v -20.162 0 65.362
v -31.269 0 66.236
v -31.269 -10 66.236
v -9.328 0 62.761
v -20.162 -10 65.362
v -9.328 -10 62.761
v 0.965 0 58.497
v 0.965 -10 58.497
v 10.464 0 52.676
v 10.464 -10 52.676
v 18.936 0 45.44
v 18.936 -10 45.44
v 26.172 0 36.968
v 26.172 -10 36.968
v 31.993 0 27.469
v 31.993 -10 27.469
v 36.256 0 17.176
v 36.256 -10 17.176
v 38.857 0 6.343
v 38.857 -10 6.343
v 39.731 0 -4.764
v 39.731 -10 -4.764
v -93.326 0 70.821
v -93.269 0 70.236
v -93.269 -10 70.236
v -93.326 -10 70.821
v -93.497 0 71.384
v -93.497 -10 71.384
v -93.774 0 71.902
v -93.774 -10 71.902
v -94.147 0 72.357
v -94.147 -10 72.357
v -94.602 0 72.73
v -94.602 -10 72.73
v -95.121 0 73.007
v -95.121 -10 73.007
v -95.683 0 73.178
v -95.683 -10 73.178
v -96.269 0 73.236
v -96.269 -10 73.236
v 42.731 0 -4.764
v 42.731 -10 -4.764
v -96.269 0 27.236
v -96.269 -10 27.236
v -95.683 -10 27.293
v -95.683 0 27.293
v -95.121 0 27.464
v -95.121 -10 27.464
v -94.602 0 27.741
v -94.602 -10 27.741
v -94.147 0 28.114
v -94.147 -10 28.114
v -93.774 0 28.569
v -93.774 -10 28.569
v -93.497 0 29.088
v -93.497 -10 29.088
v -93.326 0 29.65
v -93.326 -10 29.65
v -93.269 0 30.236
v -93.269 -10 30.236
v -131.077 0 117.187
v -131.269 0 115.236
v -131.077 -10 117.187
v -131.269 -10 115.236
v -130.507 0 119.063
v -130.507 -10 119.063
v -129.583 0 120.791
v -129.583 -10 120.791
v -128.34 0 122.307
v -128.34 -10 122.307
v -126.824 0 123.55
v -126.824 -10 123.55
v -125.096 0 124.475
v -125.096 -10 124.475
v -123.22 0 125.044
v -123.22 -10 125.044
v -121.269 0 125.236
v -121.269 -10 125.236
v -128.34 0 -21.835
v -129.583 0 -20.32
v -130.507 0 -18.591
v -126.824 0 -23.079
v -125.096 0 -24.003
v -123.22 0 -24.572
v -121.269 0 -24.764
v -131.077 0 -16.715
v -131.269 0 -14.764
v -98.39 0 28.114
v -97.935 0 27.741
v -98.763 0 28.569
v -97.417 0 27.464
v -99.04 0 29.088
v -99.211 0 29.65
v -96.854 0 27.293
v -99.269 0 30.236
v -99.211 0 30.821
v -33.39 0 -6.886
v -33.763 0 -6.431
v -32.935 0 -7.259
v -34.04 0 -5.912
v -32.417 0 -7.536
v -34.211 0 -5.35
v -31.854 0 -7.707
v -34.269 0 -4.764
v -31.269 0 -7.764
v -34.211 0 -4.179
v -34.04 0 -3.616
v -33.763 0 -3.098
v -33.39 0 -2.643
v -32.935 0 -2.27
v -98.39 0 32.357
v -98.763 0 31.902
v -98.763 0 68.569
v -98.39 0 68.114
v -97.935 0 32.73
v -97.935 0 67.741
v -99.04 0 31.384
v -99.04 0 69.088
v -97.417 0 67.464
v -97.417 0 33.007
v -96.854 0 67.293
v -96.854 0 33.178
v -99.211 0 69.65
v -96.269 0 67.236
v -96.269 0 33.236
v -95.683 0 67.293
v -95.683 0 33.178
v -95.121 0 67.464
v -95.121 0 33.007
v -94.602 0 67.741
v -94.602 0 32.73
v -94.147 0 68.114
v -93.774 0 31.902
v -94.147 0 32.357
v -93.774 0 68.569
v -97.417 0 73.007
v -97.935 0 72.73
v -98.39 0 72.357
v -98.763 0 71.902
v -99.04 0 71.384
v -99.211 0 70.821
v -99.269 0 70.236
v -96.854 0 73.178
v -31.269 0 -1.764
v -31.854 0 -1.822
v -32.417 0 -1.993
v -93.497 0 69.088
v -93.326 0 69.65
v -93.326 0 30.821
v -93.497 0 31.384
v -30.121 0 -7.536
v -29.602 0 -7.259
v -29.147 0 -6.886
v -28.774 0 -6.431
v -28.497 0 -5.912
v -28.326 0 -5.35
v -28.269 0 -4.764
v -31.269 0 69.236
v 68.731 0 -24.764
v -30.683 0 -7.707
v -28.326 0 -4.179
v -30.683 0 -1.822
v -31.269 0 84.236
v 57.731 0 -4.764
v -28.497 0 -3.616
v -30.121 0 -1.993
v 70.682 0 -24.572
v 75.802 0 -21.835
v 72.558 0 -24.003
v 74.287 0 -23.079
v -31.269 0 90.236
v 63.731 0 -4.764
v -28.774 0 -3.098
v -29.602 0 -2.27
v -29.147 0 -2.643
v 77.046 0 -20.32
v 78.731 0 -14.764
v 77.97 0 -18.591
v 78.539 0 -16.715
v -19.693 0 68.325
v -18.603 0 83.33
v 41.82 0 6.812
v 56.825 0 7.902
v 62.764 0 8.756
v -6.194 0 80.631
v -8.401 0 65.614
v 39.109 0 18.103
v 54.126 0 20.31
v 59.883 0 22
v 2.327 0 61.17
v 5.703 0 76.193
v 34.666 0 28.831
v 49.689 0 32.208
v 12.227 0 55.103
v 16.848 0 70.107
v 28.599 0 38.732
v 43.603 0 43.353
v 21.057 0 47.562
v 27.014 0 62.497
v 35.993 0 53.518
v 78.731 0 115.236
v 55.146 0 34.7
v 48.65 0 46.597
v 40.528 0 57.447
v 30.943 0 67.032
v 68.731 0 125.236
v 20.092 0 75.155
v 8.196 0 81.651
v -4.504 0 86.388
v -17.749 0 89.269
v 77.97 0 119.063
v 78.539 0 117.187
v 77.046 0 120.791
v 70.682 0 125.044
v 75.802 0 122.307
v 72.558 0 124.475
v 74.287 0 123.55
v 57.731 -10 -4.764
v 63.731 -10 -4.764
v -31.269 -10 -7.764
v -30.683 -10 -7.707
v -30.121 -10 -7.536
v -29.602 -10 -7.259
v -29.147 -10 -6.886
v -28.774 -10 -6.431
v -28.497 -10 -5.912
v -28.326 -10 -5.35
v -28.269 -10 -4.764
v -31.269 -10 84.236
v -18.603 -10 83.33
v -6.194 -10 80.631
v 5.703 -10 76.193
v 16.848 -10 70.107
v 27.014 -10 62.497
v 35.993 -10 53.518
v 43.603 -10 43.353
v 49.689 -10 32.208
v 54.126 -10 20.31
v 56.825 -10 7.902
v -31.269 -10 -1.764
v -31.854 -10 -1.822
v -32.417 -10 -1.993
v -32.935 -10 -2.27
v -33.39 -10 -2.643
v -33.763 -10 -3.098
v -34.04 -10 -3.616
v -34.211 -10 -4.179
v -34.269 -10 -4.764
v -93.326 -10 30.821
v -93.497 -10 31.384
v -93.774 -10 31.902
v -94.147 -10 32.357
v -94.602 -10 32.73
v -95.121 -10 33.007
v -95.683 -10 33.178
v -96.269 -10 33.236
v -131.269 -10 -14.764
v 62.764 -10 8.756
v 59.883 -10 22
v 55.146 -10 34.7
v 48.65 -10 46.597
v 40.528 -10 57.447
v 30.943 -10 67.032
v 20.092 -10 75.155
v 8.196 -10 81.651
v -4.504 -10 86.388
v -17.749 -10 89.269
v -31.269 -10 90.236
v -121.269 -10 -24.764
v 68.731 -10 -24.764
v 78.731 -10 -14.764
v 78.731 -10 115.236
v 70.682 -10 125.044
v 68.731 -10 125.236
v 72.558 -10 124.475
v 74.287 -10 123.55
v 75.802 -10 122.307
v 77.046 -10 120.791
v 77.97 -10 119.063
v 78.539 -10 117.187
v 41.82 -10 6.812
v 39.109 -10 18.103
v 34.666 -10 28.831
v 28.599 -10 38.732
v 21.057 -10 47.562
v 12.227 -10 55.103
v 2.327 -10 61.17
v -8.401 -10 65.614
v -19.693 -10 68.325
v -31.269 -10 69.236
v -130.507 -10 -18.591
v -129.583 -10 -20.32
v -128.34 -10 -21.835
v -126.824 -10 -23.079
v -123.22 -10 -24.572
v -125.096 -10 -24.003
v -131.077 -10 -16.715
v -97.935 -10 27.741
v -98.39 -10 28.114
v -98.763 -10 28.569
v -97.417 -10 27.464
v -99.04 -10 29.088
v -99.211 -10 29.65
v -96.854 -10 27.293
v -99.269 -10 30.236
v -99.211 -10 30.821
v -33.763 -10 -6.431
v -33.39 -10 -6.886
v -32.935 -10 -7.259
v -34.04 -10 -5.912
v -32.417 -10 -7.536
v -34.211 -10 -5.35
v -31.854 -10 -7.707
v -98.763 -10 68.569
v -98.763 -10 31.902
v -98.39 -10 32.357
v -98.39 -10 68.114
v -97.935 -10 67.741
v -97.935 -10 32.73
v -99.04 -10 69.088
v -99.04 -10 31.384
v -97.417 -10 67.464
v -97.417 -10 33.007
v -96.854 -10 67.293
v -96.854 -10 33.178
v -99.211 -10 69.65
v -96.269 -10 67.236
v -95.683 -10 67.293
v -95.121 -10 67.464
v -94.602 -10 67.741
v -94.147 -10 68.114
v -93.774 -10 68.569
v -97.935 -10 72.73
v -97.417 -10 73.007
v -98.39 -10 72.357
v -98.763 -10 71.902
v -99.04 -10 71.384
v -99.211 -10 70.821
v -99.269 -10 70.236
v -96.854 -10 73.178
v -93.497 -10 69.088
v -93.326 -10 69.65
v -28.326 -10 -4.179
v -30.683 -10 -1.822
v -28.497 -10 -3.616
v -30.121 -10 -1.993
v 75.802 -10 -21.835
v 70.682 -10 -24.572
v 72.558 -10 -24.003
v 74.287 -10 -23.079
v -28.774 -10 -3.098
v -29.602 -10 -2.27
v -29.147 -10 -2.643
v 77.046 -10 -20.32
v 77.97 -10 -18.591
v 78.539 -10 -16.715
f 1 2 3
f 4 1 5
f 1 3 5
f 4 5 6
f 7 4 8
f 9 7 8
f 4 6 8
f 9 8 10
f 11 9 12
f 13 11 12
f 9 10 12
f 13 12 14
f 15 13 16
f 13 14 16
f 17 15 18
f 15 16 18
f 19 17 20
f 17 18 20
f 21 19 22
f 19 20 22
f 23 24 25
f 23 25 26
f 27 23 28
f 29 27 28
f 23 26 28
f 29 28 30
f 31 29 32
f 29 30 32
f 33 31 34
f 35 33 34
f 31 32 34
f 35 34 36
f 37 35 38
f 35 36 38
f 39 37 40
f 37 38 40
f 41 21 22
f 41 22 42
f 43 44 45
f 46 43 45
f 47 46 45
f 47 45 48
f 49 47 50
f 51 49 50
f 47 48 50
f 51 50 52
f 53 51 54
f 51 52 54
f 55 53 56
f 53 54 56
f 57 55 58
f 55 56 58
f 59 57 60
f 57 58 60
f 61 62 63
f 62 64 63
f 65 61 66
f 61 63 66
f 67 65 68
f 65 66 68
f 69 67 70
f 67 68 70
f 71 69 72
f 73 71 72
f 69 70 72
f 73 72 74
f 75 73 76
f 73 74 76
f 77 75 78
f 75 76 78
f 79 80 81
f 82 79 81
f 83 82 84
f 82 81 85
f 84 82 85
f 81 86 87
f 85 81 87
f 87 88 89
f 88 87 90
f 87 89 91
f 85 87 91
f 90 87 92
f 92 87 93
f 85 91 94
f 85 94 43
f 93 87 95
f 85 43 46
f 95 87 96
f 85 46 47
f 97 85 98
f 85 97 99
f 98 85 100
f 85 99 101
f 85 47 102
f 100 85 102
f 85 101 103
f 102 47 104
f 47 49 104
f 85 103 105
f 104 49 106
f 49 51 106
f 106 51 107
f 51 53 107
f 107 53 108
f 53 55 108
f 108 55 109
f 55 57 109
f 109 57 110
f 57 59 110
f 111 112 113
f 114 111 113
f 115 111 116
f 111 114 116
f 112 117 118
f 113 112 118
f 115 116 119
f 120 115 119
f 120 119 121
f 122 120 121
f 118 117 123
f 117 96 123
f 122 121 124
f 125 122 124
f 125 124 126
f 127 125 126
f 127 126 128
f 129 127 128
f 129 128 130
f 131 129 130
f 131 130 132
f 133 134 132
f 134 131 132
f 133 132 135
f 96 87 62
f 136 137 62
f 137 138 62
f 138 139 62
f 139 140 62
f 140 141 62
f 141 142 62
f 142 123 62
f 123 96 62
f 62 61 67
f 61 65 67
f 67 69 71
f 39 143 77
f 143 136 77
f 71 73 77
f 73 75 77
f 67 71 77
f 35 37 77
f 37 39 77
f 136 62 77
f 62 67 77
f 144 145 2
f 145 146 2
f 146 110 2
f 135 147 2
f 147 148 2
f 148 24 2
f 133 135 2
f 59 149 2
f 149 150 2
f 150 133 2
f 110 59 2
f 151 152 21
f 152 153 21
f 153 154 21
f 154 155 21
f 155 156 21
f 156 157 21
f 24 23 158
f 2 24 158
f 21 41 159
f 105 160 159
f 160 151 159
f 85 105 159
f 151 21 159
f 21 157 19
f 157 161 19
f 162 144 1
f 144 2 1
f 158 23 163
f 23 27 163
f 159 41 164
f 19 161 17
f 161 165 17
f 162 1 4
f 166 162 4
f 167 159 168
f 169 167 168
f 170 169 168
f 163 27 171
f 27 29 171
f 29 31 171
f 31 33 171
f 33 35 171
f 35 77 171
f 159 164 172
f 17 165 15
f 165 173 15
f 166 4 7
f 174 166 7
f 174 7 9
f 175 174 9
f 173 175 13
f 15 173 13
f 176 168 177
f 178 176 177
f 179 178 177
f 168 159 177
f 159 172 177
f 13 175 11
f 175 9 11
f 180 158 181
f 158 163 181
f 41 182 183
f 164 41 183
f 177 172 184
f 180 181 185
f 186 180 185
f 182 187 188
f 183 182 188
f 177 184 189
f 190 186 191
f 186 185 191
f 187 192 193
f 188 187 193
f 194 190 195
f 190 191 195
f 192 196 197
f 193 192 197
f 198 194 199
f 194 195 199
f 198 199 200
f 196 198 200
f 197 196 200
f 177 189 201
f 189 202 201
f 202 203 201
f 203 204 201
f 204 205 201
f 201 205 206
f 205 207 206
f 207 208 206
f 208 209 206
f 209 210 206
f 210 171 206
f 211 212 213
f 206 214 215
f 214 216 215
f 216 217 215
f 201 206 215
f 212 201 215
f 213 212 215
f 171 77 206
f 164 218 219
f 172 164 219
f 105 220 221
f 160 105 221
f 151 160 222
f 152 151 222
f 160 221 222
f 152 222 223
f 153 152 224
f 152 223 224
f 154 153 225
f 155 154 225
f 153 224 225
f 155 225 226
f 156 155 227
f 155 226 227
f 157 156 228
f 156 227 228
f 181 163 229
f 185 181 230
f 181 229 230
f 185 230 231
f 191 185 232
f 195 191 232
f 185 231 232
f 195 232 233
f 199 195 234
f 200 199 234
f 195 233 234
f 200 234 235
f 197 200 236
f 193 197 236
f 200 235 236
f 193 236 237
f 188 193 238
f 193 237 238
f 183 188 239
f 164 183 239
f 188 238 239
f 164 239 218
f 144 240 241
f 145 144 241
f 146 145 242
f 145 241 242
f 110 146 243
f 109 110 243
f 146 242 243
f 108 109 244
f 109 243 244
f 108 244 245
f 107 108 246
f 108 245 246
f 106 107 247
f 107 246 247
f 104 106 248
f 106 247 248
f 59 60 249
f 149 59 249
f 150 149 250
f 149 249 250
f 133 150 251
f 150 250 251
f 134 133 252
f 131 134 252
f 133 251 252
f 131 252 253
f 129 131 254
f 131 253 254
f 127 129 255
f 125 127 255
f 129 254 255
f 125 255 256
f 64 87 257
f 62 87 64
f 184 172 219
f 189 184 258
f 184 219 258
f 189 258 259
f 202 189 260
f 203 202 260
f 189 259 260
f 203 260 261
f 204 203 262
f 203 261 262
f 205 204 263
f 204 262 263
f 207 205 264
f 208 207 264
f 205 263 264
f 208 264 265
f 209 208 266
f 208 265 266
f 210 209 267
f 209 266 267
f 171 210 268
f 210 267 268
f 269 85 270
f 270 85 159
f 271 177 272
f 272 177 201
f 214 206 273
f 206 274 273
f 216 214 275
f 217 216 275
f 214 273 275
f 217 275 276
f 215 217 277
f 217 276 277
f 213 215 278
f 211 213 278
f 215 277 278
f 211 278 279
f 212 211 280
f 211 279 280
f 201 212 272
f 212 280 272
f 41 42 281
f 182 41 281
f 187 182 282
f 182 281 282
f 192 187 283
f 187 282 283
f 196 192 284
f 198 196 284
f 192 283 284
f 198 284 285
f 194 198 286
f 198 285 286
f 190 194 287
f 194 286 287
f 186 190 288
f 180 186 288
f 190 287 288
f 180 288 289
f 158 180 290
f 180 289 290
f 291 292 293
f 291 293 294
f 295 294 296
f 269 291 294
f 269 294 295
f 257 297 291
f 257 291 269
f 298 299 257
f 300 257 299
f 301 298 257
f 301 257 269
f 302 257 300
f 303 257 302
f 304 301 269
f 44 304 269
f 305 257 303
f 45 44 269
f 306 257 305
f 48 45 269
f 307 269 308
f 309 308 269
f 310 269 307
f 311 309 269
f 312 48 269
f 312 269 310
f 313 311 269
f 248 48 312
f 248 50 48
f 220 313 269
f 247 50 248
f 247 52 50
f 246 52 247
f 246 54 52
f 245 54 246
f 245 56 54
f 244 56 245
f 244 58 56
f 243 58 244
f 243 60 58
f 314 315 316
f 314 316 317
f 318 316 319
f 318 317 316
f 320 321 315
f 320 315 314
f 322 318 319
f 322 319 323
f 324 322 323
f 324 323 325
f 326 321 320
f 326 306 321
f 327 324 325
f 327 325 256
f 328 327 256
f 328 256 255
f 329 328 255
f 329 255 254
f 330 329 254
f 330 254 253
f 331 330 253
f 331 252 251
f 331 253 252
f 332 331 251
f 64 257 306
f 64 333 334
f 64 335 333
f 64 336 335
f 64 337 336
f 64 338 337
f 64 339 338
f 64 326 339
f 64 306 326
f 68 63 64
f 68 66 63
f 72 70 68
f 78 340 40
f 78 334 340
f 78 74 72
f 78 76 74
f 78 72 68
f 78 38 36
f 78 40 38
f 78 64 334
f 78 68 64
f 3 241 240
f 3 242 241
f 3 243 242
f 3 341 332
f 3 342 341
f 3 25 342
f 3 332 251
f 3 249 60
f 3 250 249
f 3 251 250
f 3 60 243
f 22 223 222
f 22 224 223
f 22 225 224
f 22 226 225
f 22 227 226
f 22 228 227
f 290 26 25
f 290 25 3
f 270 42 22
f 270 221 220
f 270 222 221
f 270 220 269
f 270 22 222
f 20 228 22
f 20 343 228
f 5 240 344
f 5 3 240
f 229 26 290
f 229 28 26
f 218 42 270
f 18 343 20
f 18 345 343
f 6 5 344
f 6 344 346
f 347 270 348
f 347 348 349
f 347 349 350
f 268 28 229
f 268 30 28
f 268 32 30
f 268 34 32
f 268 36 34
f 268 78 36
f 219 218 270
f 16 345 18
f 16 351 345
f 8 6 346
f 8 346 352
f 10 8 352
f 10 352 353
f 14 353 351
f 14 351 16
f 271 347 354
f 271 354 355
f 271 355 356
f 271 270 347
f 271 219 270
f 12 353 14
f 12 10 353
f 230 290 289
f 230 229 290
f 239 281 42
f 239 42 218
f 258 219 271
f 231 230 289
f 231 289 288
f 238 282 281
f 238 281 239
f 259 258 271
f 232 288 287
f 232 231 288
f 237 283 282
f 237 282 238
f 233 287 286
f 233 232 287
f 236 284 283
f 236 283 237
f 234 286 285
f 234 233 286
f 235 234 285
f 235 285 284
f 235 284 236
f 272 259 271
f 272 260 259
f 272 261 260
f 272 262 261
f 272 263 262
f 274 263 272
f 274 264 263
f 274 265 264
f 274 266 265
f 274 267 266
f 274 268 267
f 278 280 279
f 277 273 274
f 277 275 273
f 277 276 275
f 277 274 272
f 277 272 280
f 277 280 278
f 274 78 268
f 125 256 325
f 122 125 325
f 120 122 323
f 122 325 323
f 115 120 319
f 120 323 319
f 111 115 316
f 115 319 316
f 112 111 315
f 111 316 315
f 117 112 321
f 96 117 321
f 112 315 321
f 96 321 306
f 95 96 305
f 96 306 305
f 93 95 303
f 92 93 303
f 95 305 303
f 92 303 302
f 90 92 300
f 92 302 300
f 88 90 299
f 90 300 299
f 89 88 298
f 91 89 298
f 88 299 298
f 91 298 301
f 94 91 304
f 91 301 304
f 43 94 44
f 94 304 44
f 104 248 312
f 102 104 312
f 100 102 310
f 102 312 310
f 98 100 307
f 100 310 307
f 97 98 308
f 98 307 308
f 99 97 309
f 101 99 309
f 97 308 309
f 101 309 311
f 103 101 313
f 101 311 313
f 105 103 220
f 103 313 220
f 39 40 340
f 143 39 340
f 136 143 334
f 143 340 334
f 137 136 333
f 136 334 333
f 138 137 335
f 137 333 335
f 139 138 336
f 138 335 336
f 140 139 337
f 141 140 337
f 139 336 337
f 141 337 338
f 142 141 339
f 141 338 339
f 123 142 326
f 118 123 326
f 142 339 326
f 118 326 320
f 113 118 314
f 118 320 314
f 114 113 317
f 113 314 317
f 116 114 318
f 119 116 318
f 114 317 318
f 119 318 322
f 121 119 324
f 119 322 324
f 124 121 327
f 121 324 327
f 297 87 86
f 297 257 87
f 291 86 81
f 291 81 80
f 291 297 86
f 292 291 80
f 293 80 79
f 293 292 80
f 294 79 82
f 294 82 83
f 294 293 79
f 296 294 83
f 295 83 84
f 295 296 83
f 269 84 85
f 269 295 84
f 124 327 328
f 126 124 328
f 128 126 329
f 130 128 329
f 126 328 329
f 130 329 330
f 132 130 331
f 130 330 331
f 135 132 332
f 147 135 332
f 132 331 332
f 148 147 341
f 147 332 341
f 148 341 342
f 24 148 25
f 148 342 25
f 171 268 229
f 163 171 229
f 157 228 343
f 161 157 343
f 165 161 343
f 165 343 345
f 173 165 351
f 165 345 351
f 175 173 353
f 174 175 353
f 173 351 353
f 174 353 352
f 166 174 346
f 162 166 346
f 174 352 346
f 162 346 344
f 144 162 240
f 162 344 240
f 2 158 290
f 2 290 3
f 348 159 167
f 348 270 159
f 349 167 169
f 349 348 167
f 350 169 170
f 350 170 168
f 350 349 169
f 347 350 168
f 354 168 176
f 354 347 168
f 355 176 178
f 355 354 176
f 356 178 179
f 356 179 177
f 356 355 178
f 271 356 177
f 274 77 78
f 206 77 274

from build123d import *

# Parameters (mm, degrees)
F0_W     = 210
F0_H     = 150
F1_DEPTH = 10
F2_R     = 10
F3_R     = 10
F4_R     = 10
F6_DEPTH = 10


with BuildPart() as f1:
    # F0 (on Front) → F1 (new body)
    with BuildSketch(Plane.XZ):
        with Locations((-26.2686859254, 50.2357134596)):
            Rectangle(F0_W, F0_H)
    extrude(amount=F1_DEPTH)

    # F2
    f2_edges = [f1.edges().sort_by_distance(p)[0] for p in [
        (-131.268686, -5, 125.235713),
    ]]
    fillet(f2_edges, radius=F2_R)

    # F3
    f3_edges = [f1.edges().sort_by_distance(p)[0] for p in [
        (-131.268686, -5, -24.764287),
    ]]
    fillet(f3_edges, radius=F3_R)

    # F4
    f4_edges = [f1.edges().sort_by_distance(p)[0] for p in [
        (78.731314, -5, -24.764287),
        (78.731314, -5, 125.235713),
    ]]
    fillet(f4_edges, radius=F4_R)

    # F5 (on face) → F6 (cut)
    with BuildSketch(Plane.XZ.offset(10)):
        with BuildLine():
            Line((-34.2686859254, -4.7642865404), (-31.2686859254, -4.7642865404))
            Line((-31.2686859254, -4.7642865404), (-31.2686859254, -1.7642865404))
            ThreePointArc((-31.2686859254, -1.7642865404), (-33.3900062689, -2.6429661969), (-34.2686859254, -4.7642865404))
        make_face()
        with BuildLine():
            Line((-31.2686859254, -7.7642865404), (-31.2686859254, -4.7642865404))
            Line((-31.2686859254, -4.7642865404), (-34.2686859254, -4.7642865404))
            ThreePointArc((-34.2686859254, -4.7642865404), (-33.3900062689, -6.885606884), (-31.2686859254, -7.7642865404))
        make_face()
        with BuildLine():
            Line((-31.2686859254, -4.7642865404), (-28.2686859254, -4.7642865404))
            ThreePointArc((-28.2686859254, -4.7642865404), (-29.1473655818, -2.6429661969), (-31.2686859254, -1.7642865404))
            Line((-31.2686859254, -1.7642865404), (-31.2686859254, -4.7642865404))
        make_face()
        with BuildLine():
            ThreePointArc((-31.2686859254, -7.7642865404), (-29.1473655818, -6.885606884), (-28.2686859254, -4.7642865404))
            Line((-28.2686859254, -4.7642865404), (-31.2686859254, -4.7642865404))
            Line((-31.2686859254, -4.7642865404), (-31.2686859254, -7.7642865404))
        make_face()
        with BuildLine():
            ThreePointArc((-31.2686859254, 66.2357134596), (18.9358955389, 45.4402949238), (39.7313140746, -4.7642865404))
            Line((39.7313140746, -4.7642865404), (42.7313140746, -4.7642865404))
            ThreePointArc((42.7313140746, -4.7642865404), (21.0572158824, 47.5616152674), (-31.2686859254, 69.2357134596))
            Line((-31.2686859254, 69.2357134596), (-31.2686859254, 66.2357134596))
        make_face()
        with BuildLine():
            ThreePointArc((-31.2686859254, 84.2357134596), (31.6638176002, 58.1682169852), (57.7313140746, -4.7642865404))
            Line((57.7313140746, -4.7642865404), (63.7313140746, -4.7642865404))
            ThreePointArc((63.7313140746, -4.7642865404), (35.9064582873, 62.4108576723), (-31.2686859254, 90.2357134596))
            Line((-31.2686859254, 90.2357134596), (-31.2686859254, 84.2357134596))
        make_face()
        with BuildLine():
            Line((-96.2686859254, 67.2357134596), (-96.2686859254, 73.2357134596))
            ThreePointArc((-96.2686859254, 73.2357134596), (-99.2686859254, 70.2357134596), (-96.2686859254, 67.2357134596))
        make_face()
        with BuildLine():
            ThreePointArc((-93.2686859254, 70.2357134596), (-94.1473655818, 72.3570338031), (-96.2686859254, 73.2357134596))
            Line((-96.2686859254, 73.2357134596), (-96.2686859254, 67.2357134596))
            ThreePointArc((-96.2686859254, 67.2357134596), (-94.1473655818, 68.114393116), (-93.2686859254, 70.2357134596))
        make_face()
        with BuildLine():
            ThreePointArc((-96.2686859254, 33.2357134596), (-99.2686859254, 30.2357134596), (-96.2686859254, 27.2357134596))
            Line((-96.2686859254, 27.2357134596), (-96.2686859254, 33.2357134596))
        make_face()
        with BuildLine():
            Line((-96.2686859254, 33.2357134596), (-96.2686859254, 27.2357134596))
            ThreePointArc((-96.2686859254, 27.2357134596), (-94.1473655818, 28.114393116), (-93.2686859254, 30.2357134596))
            ThreePointArc((-93.2686859254, 30.2357134596), (-94.1473655818, 32.3570338031), (-96.2686859254, 33.2357134596))
        make_face()
    extrude(amount=-F6_DEPTH, mode=Mode.SUBTRACT)


solid = f1.part
